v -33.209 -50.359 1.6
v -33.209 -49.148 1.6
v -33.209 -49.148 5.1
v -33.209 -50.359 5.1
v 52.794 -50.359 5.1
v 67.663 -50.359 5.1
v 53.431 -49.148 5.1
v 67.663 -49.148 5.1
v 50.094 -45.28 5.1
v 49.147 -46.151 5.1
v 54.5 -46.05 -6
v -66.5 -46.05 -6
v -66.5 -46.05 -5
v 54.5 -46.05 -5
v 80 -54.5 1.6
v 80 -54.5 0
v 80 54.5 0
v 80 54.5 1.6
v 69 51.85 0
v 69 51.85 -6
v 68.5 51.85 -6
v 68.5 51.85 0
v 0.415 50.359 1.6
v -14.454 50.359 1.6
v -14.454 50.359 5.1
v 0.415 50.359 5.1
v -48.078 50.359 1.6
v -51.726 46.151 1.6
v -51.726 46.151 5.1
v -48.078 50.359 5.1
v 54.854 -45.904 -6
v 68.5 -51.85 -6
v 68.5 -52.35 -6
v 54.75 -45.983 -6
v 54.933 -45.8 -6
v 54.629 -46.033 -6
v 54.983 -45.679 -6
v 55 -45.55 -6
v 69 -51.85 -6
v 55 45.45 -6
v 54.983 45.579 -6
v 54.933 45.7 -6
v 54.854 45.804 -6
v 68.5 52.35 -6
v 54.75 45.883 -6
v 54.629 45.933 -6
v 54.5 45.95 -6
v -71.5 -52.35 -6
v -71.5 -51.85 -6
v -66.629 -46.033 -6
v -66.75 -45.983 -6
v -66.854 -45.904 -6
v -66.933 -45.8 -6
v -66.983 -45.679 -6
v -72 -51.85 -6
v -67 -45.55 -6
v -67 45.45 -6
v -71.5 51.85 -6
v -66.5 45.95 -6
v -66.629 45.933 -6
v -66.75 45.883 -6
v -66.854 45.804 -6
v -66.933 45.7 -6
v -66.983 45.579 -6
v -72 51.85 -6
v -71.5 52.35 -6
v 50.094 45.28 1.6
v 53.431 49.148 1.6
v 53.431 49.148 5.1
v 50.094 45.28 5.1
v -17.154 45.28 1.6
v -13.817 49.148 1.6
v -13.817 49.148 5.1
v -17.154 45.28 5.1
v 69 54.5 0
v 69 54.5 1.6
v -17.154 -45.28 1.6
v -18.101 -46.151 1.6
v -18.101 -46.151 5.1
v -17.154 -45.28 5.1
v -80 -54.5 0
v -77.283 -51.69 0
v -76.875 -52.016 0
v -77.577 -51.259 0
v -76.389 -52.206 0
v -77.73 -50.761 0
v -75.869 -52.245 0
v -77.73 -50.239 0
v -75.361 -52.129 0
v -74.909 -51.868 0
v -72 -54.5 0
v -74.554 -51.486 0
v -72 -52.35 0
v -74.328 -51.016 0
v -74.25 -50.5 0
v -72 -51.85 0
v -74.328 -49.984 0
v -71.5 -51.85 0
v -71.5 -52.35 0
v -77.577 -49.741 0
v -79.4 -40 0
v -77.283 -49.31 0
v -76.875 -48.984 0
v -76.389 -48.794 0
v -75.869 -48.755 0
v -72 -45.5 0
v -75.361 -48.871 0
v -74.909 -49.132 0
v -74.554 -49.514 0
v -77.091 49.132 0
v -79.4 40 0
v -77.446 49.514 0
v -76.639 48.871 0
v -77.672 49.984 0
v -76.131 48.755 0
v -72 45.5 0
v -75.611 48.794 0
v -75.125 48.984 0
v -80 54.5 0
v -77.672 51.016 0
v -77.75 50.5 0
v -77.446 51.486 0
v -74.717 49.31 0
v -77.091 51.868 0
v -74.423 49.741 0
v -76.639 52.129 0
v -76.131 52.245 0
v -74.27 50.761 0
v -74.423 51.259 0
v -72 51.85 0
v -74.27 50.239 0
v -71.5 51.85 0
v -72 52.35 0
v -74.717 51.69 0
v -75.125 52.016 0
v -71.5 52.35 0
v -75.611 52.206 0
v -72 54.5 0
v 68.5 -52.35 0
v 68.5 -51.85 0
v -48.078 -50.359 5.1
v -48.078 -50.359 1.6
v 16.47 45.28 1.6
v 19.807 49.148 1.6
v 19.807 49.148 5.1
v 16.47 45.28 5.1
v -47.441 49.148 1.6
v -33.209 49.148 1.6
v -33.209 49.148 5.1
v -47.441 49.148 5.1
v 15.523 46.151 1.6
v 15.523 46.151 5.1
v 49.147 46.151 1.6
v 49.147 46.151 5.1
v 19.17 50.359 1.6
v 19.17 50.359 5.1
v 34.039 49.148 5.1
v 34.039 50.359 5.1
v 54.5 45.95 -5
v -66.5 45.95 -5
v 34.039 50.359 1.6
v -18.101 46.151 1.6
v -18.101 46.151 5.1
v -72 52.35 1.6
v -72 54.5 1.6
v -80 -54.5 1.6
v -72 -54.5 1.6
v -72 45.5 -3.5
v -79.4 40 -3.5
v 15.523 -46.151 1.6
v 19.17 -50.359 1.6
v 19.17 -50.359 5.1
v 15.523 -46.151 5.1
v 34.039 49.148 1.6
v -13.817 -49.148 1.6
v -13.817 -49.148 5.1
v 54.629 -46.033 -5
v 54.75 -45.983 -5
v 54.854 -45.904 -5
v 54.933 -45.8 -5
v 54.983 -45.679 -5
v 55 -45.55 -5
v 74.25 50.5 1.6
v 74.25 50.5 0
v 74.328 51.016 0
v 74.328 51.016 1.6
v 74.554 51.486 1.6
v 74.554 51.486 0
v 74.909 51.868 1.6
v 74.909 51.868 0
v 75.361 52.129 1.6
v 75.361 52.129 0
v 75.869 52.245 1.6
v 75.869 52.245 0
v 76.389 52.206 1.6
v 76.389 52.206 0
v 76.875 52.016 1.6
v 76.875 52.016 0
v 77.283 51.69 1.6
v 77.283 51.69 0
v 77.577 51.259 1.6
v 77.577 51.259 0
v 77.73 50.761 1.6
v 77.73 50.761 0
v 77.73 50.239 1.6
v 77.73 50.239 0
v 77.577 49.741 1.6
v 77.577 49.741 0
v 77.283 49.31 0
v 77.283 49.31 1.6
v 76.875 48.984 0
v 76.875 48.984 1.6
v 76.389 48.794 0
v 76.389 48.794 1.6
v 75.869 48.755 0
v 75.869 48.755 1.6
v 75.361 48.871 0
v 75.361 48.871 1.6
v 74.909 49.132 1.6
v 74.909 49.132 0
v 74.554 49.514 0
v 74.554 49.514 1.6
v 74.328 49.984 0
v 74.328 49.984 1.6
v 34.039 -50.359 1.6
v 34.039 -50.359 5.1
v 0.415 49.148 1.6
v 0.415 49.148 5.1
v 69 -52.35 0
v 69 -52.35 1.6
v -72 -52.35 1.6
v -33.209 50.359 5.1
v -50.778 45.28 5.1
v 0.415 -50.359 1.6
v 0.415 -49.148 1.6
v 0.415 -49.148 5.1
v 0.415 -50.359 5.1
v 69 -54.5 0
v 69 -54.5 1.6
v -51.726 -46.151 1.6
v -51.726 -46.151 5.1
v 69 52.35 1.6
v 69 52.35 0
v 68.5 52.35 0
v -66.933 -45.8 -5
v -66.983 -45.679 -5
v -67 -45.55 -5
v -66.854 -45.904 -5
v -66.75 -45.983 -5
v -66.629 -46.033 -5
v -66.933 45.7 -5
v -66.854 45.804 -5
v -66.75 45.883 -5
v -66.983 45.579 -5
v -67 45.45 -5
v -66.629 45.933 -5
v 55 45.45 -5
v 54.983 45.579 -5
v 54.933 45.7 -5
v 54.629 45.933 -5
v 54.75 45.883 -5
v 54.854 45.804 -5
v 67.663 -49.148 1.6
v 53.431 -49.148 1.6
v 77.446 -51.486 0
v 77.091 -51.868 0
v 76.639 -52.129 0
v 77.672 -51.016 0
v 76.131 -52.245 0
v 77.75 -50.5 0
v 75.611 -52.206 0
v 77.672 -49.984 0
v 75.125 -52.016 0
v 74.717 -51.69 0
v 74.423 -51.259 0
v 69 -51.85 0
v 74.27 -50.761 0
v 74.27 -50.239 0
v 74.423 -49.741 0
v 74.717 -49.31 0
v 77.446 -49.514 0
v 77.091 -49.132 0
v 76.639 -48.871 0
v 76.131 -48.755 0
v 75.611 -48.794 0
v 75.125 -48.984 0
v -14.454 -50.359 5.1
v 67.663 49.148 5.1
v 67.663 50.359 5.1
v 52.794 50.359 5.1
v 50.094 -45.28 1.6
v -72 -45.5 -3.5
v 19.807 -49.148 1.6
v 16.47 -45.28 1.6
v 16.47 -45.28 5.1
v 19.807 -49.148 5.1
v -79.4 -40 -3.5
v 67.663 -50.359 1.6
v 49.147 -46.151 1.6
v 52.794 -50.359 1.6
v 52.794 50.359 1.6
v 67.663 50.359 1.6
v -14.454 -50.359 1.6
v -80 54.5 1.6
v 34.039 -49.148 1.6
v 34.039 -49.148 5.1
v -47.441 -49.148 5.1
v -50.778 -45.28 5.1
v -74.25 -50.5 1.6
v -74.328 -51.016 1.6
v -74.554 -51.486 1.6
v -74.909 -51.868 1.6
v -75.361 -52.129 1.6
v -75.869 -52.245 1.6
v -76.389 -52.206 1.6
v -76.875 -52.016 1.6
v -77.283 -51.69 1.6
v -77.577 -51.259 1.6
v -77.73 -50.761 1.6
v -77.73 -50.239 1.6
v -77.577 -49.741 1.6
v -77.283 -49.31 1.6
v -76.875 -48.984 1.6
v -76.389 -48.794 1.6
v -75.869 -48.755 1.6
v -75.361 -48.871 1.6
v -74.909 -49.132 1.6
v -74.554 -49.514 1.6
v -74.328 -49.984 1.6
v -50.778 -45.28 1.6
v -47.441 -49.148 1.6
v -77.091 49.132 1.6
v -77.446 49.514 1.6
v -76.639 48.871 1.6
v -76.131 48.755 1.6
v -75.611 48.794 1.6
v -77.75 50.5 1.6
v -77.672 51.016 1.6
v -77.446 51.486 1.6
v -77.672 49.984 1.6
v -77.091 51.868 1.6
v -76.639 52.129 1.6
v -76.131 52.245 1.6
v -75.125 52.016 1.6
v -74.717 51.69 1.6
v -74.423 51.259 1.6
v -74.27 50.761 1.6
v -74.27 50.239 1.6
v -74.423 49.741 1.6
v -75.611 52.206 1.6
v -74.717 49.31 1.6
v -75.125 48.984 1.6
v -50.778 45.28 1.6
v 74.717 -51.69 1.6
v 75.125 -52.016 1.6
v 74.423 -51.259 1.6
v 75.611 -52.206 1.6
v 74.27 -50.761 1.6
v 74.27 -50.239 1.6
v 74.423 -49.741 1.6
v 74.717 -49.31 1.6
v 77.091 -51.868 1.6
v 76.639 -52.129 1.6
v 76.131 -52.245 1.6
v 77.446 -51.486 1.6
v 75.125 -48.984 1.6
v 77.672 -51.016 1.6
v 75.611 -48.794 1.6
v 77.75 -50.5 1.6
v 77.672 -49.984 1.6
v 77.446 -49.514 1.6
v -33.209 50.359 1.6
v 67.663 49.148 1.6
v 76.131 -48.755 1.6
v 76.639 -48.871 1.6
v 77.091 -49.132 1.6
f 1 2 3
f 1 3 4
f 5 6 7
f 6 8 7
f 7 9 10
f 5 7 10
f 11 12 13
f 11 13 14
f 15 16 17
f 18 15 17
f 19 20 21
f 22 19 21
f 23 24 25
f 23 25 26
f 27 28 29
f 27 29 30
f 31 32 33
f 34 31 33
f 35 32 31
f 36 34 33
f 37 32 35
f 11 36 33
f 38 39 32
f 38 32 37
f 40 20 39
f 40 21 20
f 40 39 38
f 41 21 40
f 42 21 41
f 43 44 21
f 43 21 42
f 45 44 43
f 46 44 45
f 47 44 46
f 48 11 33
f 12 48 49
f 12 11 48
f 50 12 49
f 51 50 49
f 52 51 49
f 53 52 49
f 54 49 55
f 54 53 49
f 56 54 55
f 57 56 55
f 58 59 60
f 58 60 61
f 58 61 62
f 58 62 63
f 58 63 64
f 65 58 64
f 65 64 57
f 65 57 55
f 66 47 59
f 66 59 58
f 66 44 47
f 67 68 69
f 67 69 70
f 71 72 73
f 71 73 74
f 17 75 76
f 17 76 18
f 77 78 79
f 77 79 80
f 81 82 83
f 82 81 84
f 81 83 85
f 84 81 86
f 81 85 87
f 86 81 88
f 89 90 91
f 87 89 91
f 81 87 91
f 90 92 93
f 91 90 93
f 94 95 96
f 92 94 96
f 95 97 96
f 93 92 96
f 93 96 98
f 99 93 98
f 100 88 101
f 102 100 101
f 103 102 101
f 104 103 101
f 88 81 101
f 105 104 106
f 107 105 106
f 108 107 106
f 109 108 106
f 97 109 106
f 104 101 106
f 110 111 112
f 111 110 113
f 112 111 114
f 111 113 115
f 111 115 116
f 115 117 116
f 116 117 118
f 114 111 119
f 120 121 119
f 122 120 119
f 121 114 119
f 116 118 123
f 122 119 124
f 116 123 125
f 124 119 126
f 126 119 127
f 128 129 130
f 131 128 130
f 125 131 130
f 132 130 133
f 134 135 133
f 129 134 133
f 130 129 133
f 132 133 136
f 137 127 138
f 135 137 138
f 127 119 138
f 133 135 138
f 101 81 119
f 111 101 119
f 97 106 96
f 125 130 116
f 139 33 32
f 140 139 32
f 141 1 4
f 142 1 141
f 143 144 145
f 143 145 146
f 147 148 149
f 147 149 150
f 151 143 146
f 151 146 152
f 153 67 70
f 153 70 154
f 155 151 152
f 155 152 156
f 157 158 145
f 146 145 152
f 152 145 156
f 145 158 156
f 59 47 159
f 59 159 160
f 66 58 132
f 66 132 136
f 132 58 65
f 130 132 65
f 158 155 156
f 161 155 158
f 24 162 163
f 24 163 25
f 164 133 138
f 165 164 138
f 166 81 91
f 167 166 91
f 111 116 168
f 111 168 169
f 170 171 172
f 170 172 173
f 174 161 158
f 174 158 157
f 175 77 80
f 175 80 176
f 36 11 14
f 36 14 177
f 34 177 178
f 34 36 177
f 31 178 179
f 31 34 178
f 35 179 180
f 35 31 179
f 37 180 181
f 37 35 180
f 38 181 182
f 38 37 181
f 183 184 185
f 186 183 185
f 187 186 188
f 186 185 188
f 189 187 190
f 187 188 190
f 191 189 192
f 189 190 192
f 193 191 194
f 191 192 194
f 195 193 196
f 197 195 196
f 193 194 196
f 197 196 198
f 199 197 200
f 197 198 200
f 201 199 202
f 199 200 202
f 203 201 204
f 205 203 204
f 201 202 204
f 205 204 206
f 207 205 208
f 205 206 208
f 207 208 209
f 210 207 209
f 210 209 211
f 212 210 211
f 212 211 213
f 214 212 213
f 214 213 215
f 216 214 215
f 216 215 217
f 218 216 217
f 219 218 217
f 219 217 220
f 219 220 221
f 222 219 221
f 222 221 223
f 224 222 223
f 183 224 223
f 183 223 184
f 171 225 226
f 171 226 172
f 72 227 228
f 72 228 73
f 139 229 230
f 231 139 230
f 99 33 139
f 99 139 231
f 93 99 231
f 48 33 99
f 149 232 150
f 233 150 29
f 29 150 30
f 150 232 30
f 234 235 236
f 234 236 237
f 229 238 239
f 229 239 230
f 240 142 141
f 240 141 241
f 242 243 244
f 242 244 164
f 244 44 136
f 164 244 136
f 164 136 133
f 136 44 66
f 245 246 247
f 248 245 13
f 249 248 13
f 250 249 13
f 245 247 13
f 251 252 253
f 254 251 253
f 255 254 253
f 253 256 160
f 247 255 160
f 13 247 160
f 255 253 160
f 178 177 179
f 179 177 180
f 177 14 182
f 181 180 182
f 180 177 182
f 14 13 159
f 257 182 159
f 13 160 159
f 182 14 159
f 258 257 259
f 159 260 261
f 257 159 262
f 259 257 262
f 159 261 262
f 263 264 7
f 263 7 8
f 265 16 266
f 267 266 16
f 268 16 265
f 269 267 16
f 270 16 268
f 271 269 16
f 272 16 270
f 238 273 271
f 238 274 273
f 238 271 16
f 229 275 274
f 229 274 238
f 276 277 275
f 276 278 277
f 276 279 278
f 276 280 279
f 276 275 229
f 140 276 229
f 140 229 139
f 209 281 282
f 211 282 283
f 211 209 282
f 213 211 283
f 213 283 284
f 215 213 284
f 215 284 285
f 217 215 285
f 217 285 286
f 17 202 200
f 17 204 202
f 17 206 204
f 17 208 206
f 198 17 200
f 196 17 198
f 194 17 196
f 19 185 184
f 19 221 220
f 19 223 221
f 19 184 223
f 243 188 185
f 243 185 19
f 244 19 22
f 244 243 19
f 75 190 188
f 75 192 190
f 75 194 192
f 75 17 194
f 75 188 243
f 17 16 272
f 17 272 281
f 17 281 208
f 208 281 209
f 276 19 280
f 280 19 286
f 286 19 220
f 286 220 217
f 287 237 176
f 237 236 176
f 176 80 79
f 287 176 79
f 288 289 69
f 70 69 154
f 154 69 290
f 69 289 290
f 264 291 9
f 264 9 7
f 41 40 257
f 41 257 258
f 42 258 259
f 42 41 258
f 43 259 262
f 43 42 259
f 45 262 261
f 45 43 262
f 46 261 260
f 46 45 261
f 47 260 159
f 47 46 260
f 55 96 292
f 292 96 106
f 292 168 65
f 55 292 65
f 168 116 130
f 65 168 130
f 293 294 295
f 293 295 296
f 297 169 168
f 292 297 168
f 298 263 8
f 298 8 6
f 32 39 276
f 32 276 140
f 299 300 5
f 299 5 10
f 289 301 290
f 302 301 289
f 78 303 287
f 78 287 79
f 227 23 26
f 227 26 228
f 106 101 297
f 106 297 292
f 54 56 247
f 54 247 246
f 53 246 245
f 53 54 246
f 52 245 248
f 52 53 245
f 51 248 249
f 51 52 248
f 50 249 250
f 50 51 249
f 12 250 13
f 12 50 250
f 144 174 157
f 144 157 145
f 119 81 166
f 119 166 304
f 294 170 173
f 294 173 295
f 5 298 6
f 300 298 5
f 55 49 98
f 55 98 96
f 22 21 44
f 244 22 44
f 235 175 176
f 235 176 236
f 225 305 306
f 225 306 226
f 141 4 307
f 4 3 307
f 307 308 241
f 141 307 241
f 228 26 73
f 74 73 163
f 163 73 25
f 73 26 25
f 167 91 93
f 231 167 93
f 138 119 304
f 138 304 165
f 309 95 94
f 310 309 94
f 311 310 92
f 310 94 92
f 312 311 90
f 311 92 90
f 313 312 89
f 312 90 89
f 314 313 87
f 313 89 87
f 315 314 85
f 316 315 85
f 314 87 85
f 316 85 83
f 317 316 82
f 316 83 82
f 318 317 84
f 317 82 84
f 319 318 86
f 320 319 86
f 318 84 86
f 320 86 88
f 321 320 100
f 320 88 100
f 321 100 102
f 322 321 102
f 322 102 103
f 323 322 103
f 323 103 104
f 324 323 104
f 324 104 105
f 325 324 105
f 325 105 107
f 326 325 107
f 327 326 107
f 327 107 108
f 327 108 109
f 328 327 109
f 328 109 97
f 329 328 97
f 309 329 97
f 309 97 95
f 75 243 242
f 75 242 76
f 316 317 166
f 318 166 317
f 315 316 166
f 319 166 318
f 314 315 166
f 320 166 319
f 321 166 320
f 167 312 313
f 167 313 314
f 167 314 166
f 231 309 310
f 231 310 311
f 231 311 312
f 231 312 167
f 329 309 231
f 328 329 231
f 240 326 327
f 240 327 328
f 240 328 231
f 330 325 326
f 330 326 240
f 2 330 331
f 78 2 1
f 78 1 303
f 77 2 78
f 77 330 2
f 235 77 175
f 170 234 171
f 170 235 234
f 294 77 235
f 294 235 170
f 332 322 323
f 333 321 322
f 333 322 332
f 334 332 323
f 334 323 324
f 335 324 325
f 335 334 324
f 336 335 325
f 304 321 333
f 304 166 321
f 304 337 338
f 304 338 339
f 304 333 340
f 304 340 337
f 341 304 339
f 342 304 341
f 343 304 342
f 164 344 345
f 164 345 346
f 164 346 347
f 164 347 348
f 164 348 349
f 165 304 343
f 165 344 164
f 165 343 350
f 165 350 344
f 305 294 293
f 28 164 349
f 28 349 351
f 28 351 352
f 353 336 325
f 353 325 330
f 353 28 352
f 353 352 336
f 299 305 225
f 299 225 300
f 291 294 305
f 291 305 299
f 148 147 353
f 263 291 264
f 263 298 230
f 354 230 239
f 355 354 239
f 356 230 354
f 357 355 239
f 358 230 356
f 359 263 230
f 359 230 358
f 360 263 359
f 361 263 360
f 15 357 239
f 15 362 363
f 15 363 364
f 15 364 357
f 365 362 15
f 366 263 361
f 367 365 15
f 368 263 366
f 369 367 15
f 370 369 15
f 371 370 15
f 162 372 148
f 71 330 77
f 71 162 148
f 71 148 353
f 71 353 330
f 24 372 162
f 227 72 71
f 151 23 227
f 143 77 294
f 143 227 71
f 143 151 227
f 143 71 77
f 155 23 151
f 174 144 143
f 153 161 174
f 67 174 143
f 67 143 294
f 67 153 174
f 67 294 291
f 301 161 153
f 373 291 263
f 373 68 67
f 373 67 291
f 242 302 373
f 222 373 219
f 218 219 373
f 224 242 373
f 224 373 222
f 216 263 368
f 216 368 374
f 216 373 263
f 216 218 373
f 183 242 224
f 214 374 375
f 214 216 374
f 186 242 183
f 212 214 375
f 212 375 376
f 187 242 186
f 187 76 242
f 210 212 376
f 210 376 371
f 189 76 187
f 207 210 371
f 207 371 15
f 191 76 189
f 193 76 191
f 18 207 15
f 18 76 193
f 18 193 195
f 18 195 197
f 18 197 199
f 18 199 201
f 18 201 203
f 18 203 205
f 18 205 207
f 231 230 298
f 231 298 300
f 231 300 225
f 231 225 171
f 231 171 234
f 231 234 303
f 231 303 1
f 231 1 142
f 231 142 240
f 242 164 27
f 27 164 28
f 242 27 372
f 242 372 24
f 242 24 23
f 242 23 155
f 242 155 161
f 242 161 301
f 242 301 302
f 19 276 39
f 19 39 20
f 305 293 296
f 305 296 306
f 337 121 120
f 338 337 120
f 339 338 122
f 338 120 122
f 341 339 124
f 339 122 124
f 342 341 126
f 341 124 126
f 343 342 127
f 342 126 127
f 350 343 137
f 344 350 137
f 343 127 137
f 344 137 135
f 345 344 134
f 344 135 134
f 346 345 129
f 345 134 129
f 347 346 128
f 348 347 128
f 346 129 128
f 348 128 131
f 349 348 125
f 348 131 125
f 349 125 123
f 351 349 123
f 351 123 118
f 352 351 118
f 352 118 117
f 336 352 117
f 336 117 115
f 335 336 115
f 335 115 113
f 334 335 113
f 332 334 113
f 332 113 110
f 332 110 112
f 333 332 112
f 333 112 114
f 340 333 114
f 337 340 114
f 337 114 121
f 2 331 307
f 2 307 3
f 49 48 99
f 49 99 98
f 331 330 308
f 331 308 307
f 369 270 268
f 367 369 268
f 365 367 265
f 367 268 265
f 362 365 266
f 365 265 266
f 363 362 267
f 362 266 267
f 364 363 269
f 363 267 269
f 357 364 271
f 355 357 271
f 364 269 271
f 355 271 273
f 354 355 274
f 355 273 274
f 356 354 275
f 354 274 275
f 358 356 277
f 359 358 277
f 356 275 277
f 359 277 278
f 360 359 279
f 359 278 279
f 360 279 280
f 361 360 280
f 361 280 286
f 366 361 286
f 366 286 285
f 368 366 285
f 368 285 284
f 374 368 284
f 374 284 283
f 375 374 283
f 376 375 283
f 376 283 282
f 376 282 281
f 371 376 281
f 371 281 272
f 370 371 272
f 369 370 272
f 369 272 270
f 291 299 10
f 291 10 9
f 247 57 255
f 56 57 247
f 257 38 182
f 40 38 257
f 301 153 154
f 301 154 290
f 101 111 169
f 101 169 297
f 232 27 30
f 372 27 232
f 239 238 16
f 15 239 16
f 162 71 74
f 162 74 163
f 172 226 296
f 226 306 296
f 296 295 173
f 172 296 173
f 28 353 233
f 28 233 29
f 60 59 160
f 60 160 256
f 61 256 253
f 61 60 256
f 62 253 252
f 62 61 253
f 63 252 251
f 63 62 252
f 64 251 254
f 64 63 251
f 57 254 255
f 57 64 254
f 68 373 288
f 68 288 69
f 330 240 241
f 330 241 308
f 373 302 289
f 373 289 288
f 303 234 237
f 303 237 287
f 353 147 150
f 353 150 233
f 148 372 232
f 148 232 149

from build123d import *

# Parameters (mm, degrees)
SKETCH_1_W          = 160
SKETCH_1_H          = 109
EXTRUDE_1_DEPTH     = 1.6
SKETCH_2_R          = 1.75
CUT_EXTRUDE_1_DEPTH = 2
SKETCH_4_W          = 141
SKETCH_4_H          = 104.7
EXTRUDE_2_DEPTH     = 6
SKETCH_13_W         = 141
SKETCH_13_H         = 2.15
CUT_EXTRUDE_4_DEPTH = 10
CUT_EXTRUDE_2_DEPTH = 1
SKETCH_6_W          = 0.5
SKETCH_6_H          = 0.5
CUT_EXTRUDE_3_DEPTH = 6
EXTRUDE_5_DEPTH     = 3.5
EXTRUDE_6_DEPTH     = 3.5


with BuildPart() as part:
    # 草图1 → 拉伸1 (new body)
    with BuildSketch(Plane.XY):
        Rectangle(SKETCH_1_W, SKETCH_1_H)
    extrude(amount=EXTRUDE_1_DEPTH)

    # 草图2 → 切除-拉伸1 (cut)
    with BuildSketch(Plane(origin=(0, 0, 0), x_dir=(-1, 0, 0), z_dir=(0, 0, -1))):
        with Locations((-76, 50.5)):
            Circle(SKETCH_2_R)
        with Locations((76, 50.5)):
            Circle(SKETCH_2_R)
        with Locations(Location((76, -50.5, 0), (0, 0, 180))):
            Circle(SKETCH_2_R)
        with Locations(Location((-76, -50.5, 0), (0, 0, 180))):
            Circle(SKETCH_2_R)
    extrude(amount=-CUT_EXTRUDE_1_DEPTH, mode=Mode.SUBTRACT)

    # 草图4 → 拉伸2 (add)
    with BuildSketch(Plane(origin=(0, 0, 0), x_dir=(-1, 0, 0), z_dir=(0, 0, -1))):
        with Locations((1.5, 0)):
            Rectangle(SKETCH_4_W, SKETCH_4_H)
    extrude(amount=EXTRUDE_2_DEPTH)

    # 草图13 → 切除-拉伸4 (cut)
    with BuildSketch(Plane(origin=(0, 0, 0), x_dir=(-1, 0, 0), z_dir=(0, 0, -1))):
        with Locations((1.5, 53.425)):
            Rectangle(SKETCH_13_W, SKETCH_13_H)
        with Locations((1.5, -53.425)):
            Rectangle(SKETCH_13_W, SKETCH_13_H)
    extrude(amount=-CUT_EXTRUDE_4_DEPTH, mode=Mode.SUBTRACT)

    # 草图5 → 切除-拉伸2 (cut)
    with BuildSketch(Plane(origin=(0, 0, -6), x_dir=(-1, 0, 0), z_dir=(0, 0, -1))):
        with BuildLine():
            Line((-54.5, 45.95), (66.5, 45.95))
            ThreePointArc((66.5, 45.95), (66.853553391, 45.803553391), (67, 45.45))
            Line((67, 45.45), (67, -45.55))
            ThreePointArc((67, -45.55), (66.853553391, -45.903553391), (66.5, -46.05))
            Line((66.5, -46.05), (-54.5, -46.05))
            ThreePointArc((-54.5, -46.05), (-54.853553391, -45.903553391), (-55, -45.55))
            Line((-55, -45.55), (-55, 45.45))
            ThreePointArc((-55, 45.45), (-54.853553391, 45.803553391), (-54.5, 45.95))
        make_face()
    extrude(amount=-CUT_EXTRUDE_2_DEPTH, mode=Mode.SUBTRACT)

    # 草图6 → 切除-拉伸3 (cut)
    with BuildSketch(Plane(origin=(0, 0, -6), x_dir=(-1, 0, 0), z_dir=(0, 0, -1))):
        with Locations((71.75, 52.1)):
            Rectangle(SKETCH_6_W, SKETCH_6_H)
        with Locations((71.75, -52.1)):
            Rectangle(SKETCH_6_W, SKETCH_6_H)
        with Locations((-68.75, -52.1)):
            Rectangle(SKETCH_6_W, SKETCH_6_H)
        with Locations((-68.75, 52.1)):
            Rectangle(SKETCH_6_W, SKETCH_6_H)
    extrude(amount=-CUT_EXTRUDE_3_DEPTH, mode=Mode.SUBTRACT)

    # 草图10 → 拉伸5 (add)
    with BuildSketch(Plane.XY.offset(1.6)):
        Polygon((67.662920389, -50.358827106), (52.793740241, -50.358827106), (49.146582846, -46.150568574), (50.094290582, -45.280392178), (53.430626839, -49.147509203), (67.662920389, -49.147509203), align=None)
        Polygon((34.038890847, -50.358827106), (19.169710699, -50.358827106), (15.522553304, -46.150568574), (16.470261039, -45.280392178), (19.806597297, -49.147509203), (34.038890847, -49.147509203), align=None)
        Polygon((0.414861305, -50.358827106), (-14.454318843, -50.358827106), (-18.101476238, -46.150568574), (-17.153768503, -45.280392178), (-13.817432245, -49.147509203), (0.414861305, -49.147509203), align=None)
        Polygon((-33.209168237, -50.358827106), (-48.078348385, -50.358827106), (-51.72550578, -46.150568574), (-50.777798045, -45.280392178), (-47.441461787, -49.147509203), (-33.209168237, -49.147509203), align=None)
        Polygon((-50.777798045, 45.280392178), (-51.72550578, 46.150568574), (-48.078348385, 50.358827106), (-33.209168237, 50.358827106), (-33.209168237, 49.147509203), (-47.441461787, 49.147509203), align=None)
        Polygon((-17.153768503, 45.280392178), (-18.101476238, 46.150568574), (-14.454318843, 50.358827106), (0.414861305, 50.358827106), (0.414861305, 49.147509203), (-13.817432245, 49.147509203), align=None)
        Polygon((16.470261039, 45.280392178), (15.522553304, 46.150568574), (19.169710699, 50.358827106), (34.038890847, 50.358827106), (34.038890847, 49.147509203), (19.806597297, 49.147509203), align=None)
        Polygon((67.662920389, 50.358827106), (67.662920389, 49.147509203), (53.430626839, 49.147509203), (50.094290582, 45.280392178), (49.146582846, 46.150568574), (52.793740241, 50.358827106), align=None)
    extrude(amount=EXTRUDE_5_DEPTH)

    # 草图12 → 拉伸6 (add)
    with BuildSketch(Plane(origin=(0, 0, 0), x_dir=(-1, 0, 0), z_dir=(0, 0, -1))):
        Polygon((79.4, 40), (79.4, -40), (72, -45.5), (72, 45.5), align=None)
    extrude(amount=EXTRUDE_6_DEPTH)


solid = part.part
